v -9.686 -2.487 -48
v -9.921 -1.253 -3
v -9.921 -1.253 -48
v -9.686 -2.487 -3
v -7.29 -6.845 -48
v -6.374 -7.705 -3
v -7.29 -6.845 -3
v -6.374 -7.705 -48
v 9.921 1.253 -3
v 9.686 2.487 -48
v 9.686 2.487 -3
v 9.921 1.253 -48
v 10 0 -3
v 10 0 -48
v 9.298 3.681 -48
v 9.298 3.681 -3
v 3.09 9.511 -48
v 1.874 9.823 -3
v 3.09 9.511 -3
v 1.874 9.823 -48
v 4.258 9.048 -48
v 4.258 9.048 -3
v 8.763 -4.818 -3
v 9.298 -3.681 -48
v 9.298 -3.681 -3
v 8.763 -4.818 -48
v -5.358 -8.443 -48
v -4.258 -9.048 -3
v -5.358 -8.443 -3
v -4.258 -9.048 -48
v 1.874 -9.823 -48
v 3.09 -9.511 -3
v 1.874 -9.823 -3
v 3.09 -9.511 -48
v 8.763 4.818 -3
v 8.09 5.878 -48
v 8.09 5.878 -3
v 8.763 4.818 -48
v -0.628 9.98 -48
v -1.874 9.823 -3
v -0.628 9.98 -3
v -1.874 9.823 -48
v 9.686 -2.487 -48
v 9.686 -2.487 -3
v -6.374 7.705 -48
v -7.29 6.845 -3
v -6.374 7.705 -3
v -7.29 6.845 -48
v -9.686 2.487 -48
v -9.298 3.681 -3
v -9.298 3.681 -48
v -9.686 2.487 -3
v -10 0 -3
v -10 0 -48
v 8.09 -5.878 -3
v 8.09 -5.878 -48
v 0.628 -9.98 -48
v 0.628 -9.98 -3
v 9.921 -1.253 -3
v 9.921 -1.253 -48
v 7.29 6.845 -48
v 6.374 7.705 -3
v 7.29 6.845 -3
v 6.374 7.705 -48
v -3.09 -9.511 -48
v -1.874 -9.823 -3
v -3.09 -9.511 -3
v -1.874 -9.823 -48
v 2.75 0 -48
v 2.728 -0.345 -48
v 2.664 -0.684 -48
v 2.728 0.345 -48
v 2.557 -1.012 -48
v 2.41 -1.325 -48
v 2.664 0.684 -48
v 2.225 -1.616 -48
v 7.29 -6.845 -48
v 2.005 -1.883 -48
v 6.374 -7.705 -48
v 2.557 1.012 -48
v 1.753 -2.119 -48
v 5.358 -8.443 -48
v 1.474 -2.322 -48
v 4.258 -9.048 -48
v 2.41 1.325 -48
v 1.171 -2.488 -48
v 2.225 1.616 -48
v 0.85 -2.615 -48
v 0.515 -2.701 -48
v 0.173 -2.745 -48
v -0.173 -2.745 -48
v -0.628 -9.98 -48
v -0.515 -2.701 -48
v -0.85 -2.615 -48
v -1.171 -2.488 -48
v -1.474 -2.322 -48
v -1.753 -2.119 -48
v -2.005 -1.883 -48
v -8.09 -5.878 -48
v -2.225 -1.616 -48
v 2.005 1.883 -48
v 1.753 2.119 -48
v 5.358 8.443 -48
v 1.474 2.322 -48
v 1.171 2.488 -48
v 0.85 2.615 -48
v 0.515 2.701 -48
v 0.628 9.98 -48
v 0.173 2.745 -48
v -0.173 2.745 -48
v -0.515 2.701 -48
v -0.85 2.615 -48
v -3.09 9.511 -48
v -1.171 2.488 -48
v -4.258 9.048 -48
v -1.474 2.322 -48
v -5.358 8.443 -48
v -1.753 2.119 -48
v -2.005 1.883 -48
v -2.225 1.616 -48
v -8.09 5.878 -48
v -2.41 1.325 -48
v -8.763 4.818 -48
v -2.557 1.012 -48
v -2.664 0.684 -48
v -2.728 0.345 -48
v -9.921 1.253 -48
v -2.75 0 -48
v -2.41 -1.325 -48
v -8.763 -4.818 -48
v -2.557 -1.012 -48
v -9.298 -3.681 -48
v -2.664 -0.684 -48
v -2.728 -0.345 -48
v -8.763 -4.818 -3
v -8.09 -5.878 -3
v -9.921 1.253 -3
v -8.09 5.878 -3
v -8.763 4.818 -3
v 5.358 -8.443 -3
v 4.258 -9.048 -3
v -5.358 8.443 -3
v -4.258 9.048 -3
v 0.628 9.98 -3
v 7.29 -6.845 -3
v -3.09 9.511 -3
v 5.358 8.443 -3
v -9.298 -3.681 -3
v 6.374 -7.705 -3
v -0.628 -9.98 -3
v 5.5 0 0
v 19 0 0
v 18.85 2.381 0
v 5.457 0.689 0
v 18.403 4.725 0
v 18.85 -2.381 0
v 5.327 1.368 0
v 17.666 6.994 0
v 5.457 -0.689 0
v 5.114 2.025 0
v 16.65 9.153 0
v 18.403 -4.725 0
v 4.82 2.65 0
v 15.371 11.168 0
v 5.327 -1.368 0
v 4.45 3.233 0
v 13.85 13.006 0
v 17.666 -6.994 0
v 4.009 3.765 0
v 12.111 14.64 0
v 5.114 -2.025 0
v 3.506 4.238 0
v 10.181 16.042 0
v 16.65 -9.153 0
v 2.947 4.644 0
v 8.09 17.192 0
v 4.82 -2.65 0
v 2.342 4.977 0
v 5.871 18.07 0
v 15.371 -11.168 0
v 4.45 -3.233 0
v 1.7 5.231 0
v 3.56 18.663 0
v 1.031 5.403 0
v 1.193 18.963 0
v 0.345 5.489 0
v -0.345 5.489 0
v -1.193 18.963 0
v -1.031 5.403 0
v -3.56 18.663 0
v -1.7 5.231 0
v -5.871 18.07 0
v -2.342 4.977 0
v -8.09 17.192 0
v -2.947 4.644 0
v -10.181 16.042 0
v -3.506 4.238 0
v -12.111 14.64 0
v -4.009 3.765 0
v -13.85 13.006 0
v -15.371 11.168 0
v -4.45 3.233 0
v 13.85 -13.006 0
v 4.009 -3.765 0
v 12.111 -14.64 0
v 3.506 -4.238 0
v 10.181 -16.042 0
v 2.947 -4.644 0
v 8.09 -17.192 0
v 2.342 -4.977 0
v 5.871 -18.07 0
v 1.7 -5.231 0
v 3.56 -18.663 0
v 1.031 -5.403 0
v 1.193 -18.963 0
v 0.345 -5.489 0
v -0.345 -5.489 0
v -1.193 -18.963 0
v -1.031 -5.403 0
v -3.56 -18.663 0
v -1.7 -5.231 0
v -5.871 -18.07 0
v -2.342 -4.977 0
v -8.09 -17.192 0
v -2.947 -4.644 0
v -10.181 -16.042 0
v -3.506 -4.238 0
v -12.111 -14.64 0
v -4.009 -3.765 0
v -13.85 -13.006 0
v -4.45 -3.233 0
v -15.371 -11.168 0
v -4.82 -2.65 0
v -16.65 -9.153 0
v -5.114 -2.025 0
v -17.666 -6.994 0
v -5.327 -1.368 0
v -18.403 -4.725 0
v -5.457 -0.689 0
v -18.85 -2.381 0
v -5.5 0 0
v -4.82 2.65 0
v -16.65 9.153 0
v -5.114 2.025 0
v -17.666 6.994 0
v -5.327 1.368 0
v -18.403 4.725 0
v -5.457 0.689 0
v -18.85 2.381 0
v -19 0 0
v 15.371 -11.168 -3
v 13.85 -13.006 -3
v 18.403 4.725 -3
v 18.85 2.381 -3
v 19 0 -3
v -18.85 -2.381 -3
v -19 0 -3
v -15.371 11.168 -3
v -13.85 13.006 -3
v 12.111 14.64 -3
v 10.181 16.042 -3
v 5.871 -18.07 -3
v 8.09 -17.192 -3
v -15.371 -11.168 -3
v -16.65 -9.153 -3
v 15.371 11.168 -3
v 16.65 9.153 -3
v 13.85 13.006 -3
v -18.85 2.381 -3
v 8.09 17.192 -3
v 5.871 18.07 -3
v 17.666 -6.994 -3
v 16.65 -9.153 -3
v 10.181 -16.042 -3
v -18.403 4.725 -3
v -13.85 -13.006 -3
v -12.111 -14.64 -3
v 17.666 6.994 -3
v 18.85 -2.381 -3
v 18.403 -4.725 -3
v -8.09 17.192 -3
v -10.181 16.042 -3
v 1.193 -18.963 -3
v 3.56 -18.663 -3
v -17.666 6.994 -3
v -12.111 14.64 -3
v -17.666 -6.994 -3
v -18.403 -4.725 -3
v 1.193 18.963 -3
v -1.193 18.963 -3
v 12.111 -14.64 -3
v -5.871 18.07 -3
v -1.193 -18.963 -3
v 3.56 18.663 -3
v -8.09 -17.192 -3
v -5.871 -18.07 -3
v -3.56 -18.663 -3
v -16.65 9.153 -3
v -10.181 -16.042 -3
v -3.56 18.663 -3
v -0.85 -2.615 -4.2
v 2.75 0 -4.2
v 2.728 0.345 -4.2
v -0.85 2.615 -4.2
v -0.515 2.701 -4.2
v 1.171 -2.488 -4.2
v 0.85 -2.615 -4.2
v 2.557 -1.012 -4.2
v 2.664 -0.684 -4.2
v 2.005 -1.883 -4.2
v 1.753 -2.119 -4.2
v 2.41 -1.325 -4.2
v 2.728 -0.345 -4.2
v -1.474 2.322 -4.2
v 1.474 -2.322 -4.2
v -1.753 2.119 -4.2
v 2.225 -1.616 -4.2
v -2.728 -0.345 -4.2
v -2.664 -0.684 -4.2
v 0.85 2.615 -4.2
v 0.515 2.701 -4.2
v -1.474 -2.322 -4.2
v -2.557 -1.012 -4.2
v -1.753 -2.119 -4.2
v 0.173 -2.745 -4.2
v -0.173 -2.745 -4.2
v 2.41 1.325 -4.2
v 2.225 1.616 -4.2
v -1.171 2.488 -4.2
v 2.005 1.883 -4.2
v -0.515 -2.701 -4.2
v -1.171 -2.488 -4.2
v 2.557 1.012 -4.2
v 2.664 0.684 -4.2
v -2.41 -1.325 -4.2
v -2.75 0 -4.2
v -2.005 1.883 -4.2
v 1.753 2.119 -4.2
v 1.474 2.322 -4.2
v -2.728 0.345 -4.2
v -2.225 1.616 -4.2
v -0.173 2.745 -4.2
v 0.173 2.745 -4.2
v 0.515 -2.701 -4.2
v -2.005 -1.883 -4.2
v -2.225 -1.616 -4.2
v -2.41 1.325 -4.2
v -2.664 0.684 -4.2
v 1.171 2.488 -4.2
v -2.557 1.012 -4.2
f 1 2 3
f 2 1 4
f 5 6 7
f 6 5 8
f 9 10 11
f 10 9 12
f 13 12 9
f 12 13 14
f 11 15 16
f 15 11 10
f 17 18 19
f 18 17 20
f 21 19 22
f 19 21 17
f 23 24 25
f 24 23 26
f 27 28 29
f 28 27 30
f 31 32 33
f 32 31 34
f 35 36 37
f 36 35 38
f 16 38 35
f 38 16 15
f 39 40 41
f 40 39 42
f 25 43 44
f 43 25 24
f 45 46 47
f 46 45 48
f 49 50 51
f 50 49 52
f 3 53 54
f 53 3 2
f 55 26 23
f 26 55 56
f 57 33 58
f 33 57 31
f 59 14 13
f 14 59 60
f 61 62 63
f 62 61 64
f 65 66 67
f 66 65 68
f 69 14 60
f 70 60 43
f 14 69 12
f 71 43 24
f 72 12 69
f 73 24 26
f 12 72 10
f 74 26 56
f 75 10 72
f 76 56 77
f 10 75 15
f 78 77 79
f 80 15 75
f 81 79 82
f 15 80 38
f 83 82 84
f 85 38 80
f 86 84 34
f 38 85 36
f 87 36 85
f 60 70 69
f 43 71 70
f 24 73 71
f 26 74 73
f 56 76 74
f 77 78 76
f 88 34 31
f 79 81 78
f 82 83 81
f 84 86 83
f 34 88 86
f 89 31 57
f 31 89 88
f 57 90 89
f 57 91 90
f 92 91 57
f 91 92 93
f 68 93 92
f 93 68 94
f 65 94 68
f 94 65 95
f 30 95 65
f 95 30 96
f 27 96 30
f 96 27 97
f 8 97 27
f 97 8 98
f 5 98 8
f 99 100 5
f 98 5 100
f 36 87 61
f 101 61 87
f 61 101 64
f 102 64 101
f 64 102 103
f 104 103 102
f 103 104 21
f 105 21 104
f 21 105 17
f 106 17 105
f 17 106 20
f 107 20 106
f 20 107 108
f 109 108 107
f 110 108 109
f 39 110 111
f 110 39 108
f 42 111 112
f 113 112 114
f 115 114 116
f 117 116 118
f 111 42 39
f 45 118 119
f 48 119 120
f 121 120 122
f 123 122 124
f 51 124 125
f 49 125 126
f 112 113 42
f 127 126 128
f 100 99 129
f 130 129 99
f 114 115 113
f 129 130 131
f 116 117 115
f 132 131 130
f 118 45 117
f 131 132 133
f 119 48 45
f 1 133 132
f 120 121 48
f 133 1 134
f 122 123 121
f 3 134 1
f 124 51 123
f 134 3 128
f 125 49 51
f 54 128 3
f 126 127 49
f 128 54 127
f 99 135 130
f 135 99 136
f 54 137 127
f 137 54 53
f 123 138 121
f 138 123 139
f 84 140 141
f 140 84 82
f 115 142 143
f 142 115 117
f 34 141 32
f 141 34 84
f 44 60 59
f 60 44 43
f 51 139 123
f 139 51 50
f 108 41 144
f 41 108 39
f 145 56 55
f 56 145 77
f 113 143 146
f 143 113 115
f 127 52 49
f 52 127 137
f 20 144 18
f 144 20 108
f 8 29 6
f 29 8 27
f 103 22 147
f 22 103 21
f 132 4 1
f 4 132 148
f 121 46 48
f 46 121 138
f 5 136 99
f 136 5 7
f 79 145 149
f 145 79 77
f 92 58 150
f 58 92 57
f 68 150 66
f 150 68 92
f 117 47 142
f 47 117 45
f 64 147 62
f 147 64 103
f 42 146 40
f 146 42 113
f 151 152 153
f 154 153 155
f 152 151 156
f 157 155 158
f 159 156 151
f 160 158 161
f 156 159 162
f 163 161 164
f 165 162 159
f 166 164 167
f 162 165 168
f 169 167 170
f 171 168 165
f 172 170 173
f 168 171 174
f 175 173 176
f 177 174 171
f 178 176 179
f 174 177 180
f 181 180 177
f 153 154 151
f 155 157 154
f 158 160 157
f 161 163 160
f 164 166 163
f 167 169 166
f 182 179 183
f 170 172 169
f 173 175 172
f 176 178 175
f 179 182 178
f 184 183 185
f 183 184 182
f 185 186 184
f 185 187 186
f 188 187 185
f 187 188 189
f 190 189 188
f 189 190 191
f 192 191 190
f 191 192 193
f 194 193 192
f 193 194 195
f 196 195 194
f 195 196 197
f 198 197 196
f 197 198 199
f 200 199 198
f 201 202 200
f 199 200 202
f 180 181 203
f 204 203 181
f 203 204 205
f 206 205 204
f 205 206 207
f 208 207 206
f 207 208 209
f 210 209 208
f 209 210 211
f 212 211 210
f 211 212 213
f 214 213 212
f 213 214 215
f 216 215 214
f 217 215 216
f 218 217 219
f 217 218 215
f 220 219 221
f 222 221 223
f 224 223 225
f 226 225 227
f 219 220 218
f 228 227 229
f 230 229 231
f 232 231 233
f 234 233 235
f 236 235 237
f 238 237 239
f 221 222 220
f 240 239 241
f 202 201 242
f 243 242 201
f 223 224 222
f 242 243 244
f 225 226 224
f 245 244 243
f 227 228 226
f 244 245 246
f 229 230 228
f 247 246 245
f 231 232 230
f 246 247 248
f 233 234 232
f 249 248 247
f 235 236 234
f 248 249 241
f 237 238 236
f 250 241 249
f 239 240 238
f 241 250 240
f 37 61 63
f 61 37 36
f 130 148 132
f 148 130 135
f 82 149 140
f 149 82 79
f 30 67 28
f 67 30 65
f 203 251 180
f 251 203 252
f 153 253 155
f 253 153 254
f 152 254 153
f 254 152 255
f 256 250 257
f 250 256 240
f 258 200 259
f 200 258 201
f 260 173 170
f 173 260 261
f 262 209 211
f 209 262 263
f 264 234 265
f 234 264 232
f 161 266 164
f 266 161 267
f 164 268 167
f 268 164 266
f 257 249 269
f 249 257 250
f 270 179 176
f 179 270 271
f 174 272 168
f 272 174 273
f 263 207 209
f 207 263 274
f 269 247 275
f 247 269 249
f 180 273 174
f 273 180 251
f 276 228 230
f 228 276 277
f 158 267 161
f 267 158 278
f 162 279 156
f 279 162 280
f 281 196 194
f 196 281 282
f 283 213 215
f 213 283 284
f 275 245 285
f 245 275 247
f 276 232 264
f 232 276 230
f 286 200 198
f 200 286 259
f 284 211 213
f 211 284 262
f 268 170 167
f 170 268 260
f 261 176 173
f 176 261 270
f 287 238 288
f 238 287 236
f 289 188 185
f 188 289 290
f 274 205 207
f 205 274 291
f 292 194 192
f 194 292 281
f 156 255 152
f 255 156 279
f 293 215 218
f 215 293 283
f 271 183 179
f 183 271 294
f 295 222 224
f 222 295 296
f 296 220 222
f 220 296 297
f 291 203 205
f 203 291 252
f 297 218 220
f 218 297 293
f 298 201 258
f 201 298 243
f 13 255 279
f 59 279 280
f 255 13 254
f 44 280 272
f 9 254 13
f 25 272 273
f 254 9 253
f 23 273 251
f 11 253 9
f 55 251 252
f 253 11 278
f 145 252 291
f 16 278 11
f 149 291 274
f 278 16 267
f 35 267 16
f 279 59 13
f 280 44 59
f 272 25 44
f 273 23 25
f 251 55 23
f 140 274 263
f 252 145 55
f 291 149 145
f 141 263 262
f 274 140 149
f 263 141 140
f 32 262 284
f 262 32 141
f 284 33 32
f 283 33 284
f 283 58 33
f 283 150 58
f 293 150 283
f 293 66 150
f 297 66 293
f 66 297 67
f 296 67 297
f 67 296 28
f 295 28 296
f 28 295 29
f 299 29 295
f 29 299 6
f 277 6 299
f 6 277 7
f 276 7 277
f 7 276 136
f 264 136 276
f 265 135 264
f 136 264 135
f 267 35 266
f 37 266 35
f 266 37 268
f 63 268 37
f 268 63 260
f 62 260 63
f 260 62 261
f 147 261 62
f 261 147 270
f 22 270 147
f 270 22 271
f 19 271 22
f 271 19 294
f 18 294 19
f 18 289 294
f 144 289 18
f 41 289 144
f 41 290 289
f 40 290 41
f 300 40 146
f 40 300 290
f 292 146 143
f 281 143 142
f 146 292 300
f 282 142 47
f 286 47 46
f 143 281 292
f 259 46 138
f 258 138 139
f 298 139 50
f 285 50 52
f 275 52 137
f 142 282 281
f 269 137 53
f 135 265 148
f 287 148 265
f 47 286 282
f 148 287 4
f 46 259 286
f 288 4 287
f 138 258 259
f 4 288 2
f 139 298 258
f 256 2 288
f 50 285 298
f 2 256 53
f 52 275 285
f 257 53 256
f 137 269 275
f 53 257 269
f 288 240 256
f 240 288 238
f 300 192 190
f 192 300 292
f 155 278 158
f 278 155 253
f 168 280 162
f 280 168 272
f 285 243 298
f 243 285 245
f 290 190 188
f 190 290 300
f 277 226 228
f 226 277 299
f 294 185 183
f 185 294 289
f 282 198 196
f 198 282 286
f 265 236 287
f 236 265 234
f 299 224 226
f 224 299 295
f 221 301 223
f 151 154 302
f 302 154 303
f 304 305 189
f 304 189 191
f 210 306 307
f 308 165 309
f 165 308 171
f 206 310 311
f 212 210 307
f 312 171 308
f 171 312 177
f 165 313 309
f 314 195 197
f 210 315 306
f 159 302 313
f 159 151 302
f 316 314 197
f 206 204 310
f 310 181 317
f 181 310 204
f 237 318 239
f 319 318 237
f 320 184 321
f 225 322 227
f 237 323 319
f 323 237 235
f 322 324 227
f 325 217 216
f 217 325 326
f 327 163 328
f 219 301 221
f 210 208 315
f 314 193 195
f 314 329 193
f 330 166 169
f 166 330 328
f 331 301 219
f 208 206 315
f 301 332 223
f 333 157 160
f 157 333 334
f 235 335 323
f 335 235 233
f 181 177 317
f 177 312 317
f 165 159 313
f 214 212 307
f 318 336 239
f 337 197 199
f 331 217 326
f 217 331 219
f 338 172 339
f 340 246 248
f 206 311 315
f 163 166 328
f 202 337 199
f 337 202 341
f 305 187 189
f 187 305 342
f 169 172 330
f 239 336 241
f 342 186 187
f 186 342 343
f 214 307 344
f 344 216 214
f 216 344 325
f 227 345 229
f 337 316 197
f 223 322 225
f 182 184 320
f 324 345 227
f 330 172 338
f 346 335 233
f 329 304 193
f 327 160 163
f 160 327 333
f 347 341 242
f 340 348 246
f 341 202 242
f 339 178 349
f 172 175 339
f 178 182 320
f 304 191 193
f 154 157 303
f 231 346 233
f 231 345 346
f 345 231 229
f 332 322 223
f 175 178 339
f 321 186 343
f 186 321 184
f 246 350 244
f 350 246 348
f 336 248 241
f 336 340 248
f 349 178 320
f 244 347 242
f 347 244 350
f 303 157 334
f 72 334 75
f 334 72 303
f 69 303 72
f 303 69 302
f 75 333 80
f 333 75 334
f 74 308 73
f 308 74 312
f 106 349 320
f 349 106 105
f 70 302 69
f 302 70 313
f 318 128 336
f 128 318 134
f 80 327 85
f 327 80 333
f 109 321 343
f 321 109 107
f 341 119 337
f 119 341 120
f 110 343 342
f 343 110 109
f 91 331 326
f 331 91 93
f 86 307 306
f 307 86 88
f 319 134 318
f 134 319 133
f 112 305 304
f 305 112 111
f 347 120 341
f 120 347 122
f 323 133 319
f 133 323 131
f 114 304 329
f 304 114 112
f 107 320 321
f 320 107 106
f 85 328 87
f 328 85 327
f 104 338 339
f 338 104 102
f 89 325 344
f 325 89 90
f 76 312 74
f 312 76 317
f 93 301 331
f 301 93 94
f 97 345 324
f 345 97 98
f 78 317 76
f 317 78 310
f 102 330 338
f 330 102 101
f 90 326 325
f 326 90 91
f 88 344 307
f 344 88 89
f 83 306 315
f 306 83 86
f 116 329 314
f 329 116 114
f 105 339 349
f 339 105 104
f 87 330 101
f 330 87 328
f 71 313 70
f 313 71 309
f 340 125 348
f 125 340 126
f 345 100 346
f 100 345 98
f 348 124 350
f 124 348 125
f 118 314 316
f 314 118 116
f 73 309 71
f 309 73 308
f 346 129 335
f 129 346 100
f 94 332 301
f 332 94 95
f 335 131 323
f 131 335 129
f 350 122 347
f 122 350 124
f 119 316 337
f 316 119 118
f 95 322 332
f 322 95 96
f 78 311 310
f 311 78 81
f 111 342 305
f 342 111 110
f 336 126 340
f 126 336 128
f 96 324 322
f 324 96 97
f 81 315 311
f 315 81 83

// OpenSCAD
$fn = 50;


difference() {
	union() {
		translate(v = [0, 0, -48.0000000000]) {
			cylinder(h = 48, r = 10.0000000000);
		}
		translate(v = [0, 0, -3.0000000000]) {
			cylinder(h = 3, r = 19.0000000000);
		}
	}
	union() {
		translate(v = [0, 0, 0]) {
			rotate(a = [0, 0, 0]) {
				difference() {
					union() {
						#translate(v = [0, 0, -48.0000000000]) {
							cylinder(h = 48, r = 2.2500000000);
						}
						#translate(v = [0, 0, -4.2000000000]) {
							cylinder(h = 4.2000000000, r = 10.0000000000, r1 = 2.7500000000, r2 = 5.5000000000);
						}
						#translate(v = [0, 0, -48.0000000000]) {
							cylinder(h = 48, r = 2.7500000000);
						}
						#translate(v = [0, 0, -48.0000000000]) {
							cylinder(h = 48, r = 2.2500000000);
						}
					}
					union();
				}
			}
		}
	}
}
